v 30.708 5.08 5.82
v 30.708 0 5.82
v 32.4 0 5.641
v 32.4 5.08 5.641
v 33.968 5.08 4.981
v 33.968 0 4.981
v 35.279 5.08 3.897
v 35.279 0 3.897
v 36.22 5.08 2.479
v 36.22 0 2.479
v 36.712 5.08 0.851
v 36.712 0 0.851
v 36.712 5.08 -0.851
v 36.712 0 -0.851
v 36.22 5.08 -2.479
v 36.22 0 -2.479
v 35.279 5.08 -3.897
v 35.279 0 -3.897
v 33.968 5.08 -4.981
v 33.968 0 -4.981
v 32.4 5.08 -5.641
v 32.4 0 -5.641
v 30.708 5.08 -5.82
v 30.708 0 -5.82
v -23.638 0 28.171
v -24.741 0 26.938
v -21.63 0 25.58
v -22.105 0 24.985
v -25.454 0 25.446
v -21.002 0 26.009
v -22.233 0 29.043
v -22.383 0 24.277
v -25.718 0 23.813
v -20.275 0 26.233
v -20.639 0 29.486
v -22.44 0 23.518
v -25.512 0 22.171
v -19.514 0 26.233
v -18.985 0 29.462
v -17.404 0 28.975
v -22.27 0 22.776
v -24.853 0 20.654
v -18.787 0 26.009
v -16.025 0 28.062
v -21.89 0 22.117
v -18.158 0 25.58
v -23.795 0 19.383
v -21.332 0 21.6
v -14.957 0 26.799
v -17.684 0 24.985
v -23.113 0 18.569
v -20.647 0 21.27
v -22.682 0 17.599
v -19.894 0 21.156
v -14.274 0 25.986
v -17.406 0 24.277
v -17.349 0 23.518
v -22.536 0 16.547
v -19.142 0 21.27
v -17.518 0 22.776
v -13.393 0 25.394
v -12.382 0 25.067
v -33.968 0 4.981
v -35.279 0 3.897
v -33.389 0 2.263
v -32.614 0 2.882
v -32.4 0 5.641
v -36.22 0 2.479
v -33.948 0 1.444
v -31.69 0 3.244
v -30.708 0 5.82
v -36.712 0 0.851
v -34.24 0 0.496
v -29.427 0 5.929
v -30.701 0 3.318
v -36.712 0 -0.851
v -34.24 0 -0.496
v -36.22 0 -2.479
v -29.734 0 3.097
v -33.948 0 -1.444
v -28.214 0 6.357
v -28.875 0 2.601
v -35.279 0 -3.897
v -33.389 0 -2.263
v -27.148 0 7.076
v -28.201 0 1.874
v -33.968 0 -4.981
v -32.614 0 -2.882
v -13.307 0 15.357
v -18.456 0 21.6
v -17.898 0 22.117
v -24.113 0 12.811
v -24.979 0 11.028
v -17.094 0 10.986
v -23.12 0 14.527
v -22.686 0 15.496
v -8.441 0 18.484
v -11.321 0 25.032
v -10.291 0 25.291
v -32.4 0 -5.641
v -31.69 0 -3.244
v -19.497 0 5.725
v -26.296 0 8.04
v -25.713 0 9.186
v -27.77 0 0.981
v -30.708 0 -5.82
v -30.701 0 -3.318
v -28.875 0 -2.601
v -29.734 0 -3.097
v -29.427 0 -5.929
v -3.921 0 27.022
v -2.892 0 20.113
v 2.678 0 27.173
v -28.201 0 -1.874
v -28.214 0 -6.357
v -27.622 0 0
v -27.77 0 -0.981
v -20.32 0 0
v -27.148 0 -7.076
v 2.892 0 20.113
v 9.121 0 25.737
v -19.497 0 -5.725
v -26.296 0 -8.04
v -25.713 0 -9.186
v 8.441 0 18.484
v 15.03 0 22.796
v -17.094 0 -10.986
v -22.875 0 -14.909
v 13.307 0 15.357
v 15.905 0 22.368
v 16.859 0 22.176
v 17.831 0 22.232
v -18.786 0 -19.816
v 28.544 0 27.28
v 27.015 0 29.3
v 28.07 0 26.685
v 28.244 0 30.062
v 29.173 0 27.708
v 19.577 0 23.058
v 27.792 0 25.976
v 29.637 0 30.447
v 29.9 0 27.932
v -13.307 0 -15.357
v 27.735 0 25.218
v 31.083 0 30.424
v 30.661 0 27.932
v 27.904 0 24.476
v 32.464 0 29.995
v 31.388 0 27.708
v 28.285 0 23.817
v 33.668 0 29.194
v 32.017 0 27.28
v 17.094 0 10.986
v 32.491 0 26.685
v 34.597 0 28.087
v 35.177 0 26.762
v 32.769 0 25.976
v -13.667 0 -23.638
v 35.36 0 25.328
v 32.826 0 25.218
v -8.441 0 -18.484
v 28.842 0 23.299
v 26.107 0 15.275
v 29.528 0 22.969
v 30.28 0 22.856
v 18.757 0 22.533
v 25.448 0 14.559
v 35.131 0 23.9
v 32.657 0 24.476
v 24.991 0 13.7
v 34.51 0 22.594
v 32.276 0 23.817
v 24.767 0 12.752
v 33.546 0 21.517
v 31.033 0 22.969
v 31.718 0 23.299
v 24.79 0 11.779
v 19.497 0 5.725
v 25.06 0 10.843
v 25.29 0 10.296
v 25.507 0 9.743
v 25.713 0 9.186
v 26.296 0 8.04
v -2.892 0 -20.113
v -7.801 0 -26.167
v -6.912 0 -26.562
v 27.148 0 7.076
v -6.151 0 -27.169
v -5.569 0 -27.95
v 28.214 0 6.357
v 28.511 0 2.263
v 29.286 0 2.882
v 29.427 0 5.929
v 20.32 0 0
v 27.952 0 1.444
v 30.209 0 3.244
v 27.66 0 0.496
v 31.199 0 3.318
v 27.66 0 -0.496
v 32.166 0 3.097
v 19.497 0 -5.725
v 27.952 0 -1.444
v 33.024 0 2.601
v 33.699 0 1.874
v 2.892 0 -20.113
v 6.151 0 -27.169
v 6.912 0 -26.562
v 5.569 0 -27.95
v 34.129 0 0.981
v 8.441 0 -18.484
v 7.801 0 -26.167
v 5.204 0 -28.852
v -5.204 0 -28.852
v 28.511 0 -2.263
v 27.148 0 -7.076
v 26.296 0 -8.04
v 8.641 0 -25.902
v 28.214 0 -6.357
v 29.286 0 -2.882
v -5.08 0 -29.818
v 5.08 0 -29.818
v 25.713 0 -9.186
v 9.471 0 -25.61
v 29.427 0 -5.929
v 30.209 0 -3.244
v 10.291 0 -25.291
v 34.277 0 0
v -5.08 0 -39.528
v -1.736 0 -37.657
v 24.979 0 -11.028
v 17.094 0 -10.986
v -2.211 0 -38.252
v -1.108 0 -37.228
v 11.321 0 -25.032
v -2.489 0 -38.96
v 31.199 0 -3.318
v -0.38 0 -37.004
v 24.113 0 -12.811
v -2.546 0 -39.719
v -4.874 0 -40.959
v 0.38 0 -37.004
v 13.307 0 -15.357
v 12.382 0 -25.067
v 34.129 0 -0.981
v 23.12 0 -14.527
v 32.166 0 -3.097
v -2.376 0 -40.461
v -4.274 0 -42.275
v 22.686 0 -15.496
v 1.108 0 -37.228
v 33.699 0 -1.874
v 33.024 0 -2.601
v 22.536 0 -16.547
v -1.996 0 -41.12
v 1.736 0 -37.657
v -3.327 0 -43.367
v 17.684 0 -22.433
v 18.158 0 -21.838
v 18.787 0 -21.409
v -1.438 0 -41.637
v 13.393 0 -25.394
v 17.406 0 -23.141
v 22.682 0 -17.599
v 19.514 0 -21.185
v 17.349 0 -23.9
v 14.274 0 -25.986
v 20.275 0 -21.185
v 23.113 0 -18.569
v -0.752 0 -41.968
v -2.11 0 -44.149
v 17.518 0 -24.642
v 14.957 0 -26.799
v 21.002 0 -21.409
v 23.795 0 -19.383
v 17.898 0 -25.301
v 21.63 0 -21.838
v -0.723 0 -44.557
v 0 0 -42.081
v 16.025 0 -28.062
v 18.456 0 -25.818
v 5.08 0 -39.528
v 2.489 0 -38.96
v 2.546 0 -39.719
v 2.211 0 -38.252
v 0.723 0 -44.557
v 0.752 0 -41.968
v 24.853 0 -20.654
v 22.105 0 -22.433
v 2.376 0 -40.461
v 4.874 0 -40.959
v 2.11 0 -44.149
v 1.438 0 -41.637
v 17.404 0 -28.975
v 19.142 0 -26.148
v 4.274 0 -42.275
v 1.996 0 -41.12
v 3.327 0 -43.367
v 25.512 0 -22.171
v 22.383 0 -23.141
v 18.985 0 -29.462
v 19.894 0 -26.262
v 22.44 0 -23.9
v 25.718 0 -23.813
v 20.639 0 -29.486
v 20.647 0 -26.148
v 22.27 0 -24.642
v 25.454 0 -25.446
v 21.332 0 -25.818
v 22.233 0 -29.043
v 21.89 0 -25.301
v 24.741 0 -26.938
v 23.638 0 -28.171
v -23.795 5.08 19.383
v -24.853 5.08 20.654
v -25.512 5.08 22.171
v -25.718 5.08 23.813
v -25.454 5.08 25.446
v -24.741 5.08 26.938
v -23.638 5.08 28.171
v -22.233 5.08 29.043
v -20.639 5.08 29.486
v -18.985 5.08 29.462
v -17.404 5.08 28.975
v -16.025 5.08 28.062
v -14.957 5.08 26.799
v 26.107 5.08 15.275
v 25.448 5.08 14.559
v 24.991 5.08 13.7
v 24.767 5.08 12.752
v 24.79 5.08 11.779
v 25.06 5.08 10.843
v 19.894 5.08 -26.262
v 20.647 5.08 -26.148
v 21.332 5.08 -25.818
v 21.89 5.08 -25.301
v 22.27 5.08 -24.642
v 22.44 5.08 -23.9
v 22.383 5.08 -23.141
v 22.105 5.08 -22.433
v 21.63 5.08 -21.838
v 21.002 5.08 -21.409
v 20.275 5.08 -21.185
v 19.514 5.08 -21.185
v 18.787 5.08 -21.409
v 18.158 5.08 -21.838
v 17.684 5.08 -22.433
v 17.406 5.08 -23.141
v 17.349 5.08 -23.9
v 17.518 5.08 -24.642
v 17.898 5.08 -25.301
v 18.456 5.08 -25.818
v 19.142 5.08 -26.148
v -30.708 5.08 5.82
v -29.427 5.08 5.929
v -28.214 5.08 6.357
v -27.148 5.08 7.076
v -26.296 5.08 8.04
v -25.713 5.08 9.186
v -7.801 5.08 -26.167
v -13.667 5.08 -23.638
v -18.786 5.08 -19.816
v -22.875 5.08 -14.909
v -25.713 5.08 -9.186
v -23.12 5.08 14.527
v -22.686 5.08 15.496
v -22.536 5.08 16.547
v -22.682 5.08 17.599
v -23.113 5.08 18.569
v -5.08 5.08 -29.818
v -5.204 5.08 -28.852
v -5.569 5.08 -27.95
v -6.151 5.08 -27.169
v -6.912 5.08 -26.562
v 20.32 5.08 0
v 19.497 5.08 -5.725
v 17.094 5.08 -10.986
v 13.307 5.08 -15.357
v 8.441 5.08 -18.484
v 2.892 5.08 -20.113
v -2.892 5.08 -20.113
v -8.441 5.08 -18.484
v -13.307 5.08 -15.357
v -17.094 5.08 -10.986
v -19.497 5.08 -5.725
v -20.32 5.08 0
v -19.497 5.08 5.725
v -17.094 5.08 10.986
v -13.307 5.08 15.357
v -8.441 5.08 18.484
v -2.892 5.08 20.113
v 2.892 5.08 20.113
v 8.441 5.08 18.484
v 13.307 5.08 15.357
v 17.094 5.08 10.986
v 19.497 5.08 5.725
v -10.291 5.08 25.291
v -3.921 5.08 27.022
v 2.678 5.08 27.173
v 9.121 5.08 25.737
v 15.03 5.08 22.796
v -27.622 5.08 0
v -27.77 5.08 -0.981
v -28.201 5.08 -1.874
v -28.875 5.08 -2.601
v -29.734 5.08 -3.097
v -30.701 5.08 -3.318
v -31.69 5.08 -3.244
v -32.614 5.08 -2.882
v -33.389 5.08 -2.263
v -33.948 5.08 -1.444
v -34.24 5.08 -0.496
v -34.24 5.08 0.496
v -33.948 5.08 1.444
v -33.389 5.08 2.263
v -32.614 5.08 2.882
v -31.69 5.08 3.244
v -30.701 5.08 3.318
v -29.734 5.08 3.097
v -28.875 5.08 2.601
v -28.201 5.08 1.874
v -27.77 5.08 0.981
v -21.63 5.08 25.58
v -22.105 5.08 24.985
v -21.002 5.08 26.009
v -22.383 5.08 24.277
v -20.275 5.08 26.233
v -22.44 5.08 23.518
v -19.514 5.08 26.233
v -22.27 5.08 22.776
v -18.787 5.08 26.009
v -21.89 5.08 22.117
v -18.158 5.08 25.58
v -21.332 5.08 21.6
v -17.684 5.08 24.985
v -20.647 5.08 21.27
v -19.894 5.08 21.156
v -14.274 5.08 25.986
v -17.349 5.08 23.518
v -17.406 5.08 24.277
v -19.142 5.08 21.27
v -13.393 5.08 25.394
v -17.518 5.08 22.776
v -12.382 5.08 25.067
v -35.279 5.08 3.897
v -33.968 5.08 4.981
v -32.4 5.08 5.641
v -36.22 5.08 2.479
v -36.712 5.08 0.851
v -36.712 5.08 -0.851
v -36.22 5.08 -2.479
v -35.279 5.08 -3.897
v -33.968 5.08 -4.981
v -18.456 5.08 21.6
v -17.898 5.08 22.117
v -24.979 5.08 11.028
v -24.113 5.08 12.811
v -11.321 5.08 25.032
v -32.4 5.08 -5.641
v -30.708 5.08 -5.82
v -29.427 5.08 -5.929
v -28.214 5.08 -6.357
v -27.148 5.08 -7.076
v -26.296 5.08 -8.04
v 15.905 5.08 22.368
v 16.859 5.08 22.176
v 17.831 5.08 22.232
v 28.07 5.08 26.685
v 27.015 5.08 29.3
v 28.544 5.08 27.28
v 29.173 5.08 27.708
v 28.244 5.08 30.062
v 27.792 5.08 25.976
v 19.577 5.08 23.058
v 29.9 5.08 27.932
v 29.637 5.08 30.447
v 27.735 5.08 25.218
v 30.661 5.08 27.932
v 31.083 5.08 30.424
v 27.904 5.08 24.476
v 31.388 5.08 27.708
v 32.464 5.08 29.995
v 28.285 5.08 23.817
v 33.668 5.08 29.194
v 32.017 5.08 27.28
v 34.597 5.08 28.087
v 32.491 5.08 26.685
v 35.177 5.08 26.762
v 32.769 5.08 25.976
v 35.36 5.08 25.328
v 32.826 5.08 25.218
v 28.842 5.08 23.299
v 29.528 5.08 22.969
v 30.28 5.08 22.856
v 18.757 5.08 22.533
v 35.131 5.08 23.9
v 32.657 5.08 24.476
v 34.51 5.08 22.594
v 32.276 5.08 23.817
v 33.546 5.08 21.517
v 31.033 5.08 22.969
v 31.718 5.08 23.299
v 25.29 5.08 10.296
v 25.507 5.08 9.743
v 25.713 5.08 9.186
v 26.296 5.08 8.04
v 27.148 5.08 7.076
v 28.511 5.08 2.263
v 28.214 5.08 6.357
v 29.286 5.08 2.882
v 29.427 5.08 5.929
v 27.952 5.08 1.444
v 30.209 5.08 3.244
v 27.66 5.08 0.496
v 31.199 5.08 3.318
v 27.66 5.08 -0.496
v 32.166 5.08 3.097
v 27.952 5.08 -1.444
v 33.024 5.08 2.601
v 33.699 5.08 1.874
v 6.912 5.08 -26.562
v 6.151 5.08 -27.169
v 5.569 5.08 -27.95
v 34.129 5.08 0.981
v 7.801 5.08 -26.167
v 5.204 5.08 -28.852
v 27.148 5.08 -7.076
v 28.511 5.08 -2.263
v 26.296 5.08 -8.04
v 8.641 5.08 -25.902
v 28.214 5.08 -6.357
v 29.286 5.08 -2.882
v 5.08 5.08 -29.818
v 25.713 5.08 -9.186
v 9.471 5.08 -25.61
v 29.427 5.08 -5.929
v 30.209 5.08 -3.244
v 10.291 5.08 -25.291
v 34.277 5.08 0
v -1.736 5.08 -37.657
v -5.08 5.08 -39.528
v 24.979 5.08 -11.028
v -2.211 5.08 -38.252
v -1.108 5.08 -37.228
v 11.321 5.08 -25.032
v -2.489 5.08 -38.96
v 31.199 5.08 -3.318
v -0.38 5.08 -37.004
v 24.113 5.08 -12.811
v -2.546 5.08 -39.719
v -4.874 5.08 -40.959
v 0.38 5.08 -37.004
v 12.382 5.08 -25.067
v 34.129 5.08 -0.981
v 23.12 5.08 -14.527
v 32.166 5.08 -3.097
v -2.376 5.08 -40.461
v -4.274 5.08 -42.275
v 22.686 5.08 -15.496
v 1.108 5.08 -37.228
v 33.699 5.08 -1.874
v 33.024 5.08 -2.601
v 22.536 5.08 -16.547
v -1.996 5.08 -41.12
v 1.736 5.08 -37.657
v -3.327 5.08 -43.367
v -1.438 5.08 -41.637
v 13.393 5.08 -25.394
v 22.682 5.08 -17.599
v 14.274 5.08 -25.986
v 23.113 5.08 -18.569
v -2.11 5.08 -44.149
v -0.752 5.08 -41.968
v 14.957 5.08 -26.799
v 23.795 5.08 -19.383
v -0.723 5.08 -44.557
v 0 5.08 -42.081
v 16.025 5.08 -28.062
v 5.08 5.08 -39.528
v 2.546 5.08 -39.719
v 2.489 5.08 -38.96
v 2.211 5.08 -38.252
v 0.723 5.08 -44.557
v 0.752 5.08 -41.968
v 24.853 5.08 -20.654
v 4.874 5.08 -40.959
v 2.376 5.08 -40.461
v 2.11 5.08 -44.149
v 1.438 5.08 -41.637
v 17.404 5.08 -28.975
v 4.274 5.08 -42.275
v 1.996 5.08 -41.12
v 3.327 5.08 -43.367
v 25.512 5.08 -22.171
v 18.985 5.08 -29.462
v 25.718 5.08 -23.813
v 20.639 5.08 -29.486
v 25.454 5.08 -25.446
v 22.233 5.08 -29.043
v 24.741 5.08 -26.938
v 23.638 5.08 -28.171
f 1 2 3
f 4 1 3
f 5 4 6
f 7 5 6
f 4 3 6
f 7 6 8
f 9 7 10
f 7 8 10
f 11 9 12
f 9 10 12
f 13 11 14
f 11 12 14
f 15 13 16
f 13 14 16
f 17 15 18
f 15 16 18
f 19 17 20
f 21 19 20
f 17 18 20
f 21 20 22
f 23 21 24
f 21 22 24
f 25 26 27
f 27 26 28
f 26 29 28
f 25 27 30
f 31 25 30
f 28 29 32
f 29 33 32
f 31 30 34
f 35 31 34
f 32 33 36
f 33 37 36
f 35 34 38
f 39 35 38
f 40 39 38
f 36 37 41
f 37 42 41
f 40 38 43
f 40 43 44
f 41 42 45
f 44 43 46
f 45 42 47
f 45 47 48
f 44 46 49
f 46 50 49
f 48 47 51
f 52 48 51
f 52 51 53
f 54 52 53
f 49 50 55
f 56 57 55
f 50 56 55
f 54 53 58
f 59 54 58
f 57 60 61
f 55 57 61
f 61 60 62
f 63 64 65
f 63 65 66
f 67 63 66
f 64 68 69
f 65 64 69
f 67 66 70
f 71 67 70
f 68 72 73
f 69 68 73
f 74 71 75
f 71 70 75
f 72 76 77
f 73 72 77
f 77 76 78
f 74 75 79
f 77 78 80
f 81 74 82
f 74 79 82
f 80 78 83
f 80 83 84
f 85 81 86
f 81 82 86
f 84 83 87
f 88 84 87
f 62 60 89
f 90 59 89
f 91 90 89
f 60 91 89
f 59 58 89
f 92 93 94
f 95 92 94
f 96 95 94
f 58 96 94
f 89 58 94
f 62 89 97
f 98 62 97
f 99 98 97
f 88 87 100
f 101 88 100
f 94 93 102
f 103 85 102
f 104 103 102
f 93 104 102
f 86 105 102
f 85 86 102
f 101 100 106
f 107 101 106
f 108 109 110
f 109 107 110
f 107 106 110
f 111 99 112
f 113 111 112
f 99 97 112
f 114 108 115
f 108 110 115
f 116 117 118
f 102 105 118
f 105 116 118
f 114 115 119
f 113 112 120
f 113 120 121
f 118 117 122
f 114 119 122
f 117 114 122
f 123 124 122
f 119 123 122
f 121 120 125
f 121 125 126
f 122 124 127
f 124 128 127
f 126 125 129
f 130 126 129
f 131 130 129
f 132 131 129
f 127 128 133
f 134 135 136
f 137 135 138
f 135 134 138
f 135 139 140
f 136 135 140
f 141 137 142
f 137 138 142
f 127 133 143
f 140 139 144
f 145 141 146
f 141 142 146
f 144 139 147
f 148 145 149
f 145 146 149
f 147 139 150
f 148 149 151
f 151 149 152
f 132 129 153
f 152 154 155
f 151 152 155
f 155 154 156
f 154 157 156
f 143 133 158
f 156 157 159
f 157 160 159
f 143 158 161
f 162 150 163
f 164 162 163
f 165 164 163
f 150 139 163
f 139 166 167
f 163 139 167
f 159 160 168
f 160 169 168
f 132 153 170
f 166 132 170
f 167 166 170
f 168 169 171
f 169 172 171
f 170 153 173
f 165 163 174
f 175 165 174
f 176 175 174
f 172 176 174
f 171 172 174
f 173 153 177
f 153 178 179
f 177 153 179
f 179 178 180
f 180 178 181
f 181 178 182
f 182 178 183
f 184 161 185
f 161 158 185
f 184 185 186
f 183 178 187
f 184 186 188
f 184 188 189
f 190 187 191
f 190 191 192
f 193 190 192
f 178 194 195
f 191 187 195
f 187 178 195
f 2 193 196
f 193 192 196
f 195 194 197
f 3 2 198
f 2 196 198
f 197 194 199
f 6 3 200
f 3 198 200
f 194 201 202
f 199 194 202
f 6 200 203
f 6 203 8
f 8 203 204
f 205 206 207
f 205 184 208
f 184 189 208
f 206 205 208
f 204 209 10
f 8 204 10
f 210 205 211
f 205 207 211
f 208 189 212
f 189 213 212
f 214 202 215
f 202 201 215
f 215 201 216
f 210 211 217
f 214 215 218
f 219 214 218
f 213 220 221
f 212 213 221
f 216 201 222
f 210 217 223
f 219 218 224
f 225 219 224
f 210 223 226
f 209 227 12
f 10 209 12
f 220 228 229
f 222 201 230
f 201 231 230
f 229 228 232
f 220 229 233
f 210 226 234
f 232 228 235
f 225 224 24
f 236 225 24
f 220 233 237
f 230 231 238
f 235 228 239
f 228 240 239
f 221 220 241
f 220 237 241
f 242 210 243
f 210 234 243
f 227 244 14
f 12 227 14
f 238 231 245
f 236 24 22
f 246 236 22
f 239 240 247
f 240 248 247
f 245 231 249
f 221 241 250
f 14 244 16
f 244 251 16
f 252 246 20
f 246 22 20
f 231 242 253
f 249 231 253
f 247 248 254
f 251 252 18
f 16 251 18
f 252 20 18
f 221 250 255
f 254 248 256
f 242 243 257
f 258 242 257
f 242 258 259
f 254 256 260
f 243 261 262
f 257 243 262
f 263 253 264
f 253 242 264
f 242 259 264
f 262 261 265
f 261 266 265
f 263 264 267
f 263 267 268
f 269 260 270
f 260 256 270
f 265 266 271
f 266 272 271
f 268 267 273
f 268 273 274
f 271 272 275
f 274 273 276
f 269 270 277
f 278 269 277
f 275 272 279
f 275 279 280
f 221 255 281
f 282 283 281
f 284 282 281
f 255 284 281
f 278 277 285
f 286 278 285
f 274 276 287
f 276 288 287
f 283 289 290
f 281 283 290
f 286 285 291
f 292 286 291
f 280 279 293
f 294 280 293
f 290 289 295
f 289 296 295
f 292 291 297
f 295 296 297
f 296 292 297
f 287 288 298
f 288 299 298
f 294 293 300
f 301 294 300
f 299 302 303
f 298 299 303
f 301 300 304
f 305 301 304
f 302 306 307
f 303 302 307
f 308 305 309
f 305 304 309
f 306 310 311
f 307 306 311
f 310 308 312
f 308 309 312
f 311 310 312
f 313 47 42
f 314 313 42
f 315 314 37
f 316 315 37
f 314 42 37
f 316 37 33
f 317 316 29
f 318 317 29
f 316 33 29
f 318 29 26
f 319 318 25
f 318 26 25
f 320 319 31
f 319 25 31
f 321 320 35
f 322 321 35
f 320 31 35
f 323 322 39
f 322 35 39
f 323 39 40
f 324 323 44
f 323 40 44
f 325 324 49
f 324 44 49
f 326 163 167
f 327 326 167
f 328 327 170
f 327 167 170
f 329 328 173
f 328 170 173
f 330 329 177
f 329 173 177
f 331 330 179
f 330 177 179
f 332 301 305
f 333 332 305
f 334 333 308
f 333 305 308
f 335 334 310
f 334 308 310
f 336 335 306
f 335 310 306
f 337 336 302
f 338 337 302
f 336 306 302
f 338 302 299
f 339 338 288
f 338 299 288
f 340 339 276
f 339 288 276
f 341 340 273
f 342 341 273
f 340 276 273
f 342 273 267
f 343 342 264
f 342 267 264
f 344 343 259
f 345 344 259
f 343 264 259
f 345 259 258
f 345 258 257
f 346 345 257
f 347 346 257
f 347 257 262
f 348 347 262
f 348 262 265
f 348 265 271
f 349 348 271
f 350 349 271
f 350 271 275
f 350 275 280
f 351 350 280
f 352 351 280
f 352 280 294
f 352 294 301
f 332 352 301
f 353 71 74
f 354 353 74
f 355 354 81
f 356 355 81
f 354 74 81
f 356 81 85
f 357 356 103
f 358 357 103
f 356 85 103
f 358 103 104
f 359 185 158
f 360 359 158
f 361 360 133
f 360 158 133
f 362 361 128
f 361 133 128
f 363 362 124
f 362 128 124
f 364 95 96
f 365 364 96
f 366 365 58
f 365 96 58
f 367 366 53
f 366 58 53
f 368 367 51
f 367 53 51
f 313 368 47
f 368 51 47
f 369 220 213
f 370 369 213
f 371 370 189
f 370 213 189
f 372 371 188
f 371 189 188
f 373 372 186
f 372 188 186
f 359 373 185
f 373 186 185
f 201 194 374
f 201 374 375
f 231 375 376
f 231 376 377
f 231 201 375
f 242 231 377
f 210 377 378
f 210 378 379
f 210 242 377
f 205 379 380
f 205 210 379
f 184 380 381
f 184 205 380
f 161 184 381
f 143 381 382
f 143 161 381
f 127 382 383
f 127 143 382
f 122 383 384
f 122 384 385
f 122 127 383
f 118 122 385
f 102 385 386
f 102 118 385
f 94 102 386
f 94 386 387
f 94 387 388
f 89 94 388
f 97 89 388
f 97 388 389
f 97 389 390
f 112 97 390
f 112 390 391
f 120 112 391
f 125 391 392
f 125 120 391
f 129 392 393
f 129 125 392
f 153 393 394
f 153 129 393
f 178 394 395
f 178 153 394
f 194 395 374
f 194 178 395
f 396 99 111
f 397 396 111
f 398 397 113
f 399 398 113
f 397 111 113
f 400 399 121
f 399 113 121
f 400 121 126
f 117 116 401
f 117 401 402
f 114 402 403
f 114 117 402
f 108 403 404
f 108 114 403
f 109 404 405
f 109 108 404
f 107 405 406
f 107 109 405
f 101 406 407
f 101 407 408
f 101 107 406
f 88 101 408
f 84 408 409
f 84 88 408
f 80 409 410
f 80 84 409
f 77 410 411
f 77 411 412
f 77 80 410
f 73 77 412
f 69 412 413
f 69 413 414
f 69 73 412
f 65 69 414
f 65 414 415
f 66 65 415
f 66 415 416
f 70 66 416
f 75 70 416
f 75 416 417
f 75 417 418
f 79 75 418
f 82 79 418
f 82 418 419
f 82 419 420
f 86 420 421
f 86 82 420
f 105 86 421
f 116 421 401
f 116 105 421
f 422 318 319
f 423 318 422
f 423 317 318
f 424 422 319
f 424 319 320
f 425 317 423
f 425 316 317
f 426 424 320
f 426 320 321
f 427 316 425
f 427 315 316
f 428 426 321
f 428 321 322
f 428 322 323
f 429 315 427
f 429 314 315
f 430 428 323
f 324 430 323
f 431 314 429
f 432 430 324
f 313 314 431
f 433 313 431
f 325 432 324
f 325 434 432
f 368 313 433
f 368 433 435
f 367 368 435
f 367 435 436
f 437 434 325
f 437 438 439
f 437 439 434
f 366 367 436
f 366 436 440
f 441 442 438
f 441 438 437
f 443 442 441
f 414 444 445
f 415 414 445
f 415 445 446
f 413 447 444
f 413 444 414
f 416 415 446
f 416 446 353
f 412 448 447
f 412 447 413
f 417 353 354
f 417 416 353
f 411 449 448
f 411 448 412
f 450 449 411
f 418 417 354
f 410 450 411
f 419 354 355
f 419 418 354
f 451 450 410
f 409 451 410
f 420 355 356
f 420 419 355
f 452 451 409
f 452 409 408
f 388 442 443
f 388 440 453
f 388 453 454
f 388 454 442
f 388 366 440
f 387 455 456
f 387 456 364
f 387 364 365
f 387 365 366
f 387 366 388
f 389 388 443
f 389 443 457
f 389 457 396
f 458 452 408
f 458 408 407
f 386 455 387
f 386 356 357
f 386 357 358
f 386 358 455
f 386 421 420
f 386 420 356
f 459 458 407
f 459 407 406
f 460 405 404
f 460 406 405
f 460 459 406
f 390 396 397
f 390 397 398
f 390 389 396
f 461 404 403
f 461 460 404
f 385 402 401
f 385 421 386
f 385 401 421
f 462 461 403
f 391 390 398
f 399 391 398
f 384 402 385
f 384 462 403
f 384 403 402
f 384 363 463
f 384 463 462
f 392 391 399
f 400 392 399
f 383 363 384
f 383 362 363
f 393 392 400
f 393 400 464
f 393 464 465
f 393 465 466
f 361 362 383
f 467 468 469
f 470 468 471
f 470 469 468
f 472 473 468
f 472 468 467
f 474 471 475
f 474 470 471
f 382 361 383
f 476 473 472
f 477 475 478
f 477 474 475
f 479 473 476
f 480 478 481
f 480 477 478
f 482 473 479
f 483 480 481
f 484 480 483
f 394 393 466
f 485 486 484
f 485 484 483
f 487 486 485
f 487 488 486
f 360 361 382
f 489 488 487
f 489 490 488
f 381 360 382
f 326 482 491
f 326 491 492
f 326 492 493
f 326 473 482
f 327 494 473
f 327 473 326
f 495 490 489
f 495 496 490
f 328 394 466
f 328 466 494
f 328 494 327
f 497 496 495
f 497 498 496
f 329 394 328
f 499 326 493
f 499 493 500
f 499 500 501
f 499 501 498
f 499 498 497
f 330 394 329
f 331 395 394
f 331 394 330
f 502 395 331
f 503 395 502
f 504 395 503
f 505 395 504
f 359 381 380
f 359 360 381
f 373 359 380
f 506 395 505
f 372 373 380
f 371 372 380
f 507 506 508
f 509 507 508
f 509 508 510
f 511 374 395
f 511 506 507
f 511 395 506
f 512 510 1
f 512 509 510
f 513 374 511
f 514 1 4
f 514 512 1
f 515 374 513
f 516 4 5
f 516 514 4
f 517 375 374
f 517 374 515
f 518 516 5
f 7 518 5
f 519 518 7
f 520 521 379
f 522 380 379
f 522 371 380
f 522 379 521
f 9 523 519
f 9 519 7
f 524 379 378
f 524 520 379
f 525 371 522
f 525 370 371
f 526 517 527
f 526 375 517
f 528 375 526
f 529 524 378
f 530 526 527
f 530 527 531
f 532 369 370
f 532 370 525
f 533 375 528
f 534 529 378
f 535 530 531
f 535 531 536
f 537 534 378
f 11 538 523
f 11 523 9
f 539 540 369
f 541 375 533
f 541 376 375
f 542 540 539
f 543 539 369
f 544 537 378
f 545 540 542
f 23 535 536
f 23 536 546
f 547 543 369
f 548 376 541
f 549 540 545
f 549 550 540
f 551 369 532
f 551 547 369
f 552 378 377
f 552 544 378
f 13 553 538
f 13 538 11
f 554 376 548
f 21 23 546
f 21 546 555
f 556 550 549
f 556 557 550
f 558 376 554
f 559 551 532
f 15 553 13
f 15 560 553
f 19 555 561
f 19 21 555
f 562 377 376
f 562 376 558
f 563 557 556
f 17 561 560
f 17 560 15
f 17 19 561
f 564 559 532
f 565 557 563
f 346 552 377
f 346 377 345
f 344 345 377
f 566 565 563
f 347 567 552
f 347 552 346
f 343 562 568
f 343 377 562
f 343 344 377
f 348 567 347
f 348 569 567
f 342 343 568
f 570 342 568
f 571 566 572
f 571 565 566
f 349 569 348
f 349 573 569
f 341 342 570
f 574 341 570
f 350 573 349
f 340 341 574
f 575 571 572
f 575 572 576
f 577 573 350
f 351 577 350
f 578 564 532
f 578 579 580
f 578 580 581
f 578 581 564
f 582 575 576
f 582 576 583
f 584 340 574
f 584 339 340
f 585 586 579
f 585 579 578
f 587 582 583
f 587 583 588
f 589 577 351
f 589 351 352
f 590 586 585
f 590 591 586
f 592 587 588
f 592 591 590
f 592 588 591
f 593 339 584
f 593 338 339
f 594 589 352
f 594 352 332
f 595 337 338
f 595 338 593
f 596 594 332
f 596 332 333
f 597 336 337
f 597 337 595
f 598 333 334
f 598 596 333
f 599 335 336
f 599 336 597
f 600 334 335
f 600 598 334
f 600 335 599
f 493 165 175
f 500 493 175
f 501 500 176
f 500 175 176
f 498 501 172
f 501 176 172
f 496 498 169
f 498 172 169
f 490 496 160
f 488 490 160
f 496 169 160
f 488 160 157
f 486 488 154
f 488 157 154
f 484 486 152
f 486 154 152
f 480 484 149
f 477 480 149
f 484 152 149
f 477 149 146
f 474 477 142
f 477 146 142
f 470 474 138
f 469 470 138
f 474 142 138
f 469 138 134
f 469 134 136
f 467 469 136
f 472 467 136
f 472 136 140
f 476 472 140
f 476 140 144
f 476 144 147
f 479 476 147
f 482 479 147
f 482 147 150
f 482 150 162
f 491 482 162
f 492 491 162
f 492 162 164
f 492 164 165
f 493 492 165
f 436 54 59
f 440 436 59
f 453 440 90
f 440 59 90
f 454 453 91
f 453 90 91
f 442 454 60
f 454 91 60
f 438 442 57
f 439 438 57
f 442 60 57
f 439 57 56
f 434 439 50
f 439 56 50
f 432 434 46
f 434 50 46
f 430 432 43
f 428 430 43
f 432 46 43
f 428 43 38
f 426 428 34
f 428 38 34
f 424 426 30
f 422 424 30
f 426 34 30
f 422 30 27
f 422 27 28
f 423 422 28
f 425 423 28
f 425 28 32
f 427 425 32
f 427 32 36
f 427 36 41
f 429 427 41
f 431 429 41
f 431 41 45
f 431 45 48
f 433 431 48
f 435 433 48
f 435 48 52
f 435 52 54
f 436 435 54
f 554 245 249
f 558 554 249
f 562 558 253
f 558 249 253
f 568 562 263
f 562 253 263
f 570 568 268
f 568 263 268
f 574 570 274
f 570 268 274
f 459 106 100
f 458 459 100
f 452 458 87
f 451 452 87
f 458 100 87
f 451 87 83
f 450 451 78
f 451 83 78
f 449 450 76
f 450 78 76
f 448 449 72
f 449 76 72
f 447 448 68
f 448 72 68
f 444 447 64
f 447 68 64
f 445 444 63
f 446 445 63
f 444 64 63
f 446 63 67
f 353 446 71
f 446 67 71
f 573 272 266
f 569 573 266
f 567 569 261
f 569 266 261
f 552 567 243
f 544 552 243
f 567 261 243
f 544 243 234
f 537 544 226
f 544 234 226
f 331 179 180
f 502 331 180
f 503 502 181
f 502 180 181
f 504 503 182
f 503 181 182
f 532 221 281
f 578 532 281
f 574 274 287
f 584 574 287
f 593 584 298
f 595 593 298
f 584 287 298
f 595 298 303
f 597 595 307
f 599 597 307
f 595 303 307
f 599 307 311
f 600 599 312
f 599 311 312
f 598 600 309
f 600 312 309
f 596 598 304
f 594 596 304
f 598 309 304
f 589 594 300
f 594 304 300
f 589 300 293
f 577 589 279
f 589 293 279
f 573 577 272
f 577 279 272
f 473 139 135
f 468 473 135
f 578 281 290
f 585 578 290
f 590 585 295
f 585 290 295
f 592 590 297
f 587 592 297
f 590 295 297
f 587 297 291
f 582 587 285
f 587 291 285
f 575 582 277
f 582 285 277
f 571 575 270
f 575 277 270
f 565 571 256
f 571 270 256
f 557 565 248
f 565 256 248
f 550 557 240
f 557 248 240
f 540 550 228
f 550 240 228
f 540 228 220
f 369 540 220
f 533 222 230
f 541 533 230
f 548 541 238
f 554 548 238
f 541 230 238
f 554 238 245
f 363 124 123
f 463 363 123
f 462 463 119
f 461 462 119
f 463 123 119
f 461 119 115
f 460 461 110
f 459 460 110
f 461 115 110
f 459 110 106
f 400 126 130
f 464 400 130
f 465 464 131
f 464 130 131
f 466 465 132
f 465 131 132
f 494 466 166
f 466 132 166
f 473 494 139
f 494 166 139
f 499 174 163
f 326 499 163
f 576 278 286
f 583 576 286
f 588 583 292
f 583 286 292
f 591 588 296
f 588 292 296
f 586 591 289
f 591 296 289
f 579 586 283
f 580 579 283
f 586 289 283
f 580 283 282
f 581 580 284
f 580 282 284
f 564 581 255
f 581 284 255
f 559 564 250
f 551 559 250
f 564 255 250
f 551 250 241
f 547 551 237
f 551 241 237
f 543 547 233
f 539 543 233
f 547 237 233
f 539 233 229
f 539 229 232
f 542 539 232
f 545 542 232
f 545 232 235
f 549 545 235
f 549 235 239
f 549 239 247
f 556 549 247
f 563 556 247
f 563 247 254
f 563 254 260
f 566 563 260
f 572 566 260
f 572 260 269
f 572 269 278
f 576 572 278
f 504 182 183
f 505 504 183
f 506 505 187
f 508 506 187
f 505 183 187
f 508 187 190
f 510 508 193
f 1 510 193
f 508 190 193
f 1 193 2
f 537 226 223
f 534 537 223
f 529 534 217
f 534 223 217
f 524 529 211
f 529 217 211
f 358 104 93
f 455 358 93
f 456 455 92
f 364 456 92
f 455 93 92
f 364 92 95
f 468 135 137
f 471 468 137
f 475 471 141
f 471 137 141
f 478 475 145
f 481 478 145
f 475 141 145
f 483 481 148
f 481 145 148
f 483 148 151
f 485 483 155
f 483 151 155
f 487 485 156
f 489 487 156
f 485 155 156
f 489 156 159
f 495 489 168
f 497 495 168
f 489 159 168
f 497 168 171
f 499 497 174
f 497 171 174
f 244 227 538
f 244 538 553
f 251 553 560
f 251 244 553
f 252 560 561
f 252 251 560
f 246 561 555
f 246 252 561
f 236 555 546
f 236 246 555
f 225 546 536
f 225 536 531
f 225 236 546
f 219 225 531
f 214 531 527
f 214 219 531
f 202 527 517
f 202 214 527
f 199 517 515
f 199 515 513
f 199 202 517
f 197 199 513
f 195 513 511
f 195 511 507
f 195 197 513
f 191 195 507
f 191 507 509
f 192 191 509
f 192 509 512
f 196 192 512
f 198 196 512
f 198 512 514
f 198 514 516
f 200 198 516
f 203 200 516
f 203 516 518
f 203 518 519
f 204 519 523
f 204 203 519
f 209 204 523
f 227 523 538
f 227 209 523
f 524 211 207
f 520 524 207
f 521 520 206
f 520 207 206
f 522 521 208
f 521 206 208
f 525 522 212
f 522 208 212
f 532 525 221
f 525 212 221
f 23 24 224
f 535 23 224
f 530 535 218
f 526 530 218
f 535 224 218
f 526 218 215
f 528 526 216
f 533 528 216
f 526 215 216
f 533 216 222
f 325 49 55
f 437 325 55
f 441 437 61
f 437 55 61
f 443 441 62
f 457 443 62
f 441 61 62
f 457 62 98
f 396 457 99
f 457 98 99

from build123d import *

# Parameters (mm, degrees)
SKETCH1_R               = 20.32
SKETCH1_R_2             = 3.3274
BOSS_EXTRUDE1_DEPTH     = 5.08
F_1_4_20_TAPPED_HOLE1_D = 5.1054


with BuildPart() as part:
    # Sketch1 → Boss-Extrude1 (new body)
    with BuildSketch(Plane(origin=(0, 0, 0), x_dir=(1, 0, 0), z_dir=(0, 1, 0))):
        with BuildLine():
            Line((19.57652647, -23.05812517), (27.015058429, -29.299794594))
            ThreePointArc((27.015058429, -29.299794594), (34.171925257, -28.67364988), (33.545780543, -21.516783052))
            Line((33.545780543, -21.516783052), (26.107248584, -15.275113628))
            ThreePointArc((26.107248584, -15.275113628), (24.848469725, -13.233023939), (25.059583331, -10.843445406))
            ThreePointArc((25.059583331, -10.843445406), (25.400007253, -10.020112603), (25.713388999, -9.186111864))
            ThreePointArc((25.713388999, -9.186111864), (27.657978886, -6.682698723), (30.708135247, -5.81953399))
            ThreePointArc((30.708135247, -5.81953399), (36.774453721, 0), (30.708135247, 5.81953399))
            ThreePointArc((30.708135247, 5.81953399), (27.657978886, 6.682698723), (25.713388999, 9.186111864))
            ThreePointArc((25.713388999, 9.186111864), (24.562302912, 11.927124576), (23.12004719, 14.526749221))
            ThreePointArc((23.12004719, 14.526749221), (22.572337736, 17.077966647), (23.794690624, 19.383297298))
            ThreePointArc((23.794690624, 19.383297298), (23.638163205, 28.170865922), (14.956916793, 26.79907006))
            ThreePointArc((14.956916793, 26.79907006), (12.898868646, 25.194970992), (10.291301197, 25.291345252))
            ThreePointArc((10.291301197, 25.291345252), (9.056948556, 25.759167453), (7.801428571, 26.166786911))
            ThreePointArc((7.801428571, 26.166786911), (5.835204005, 27.541055979), (5.08, 29.81796648))
            Line((5.08, 29.81796648), (5.08, 39.528280321))
            ThreePointArc((5.08, 39.528280321), (0, 44.608280321), (-5.08, 39.528280321))
            Line((-5.08, 39.528280321), (-5.08, 29.81796648))
            ThreePointArc((-5.08, 29.81796648), (-5.835204005, 27.541055979), (-7.801428571, 26.166786911))
            ThreePointArc((-7.801428571, 26.166786911), (-18.785541793, 19.815812992), (-25.713388999, 9.186111864))
            ThreePointArc((-25.713388999, 9.186111864), (-27.657978886, 6.682698723), (-30.708135247, 5.81953399))
            ThreePointArc((-30.708135247, 5.81953399), (-36.774453721, 0), (-30.708135247, -5.81953399))
            ThreePointArc((-30.708135247, -5.81953399), (-27.657978886, -6.682698723), (-25.713388999, -9.186111864))
            ThreePointArc((-25.713388999, -9.186111864), (-24.562302912, -11.927124576), (-23.12004719, -14.526749221))
            ThreePointArc((-23.12004719, -14.526749221), (-22.572337736, -17.077966647), (-23.794690624, -19.383297298))
            ThreePointArc((-23.794690624, -19.383297298), (-23.638163205, -28.170865922), (-14.956916793, -26.79907006))
            ThreePointArc((-14.956916793, -26.79907006), (-12.898868646, -25.194970992), (-10.291301197, -25.291345252))
            ThreePointArc((-10.291301197, -25.291345252), (2.67791157, -27.173365905), (15.030260084, -22.795927417))
            ThreePointArc((15.030260084, -22.795927417), (17.346876056, -22.173075144), (19.57652647, -23.05812517))
        make_face()
        Circle(SKETCH1_R, mode=Mode.SUBTRACT)
        with Locations((-30.9499, 0)):
            Circle(SKETCH1_R_2, mode=Mode.SUBTRACT)
        with Locations((30.9499, 0)):
            Circle(SKETCH1_R_2, mode=Mode.SUBTRACT)
    extrude(amount=BOSS_EXTRUDE1_DEPTH)

    # 1/4-20 Tapped Hole1 (through all)
    with Locations(Plane(origin=(0, 5.08, -39.528280321), x_dir=(0, 0, 1), z_dir=(0, 1, 0))):
        with Locations((0, 0), (15.819281411, 19.894212241), (64.936569144, 30.280419486), (63.237279231, -19.894212241)):
            Hole(F_1_4_20_TAPPED_HOLE1_D / 2)


solid = part.part
